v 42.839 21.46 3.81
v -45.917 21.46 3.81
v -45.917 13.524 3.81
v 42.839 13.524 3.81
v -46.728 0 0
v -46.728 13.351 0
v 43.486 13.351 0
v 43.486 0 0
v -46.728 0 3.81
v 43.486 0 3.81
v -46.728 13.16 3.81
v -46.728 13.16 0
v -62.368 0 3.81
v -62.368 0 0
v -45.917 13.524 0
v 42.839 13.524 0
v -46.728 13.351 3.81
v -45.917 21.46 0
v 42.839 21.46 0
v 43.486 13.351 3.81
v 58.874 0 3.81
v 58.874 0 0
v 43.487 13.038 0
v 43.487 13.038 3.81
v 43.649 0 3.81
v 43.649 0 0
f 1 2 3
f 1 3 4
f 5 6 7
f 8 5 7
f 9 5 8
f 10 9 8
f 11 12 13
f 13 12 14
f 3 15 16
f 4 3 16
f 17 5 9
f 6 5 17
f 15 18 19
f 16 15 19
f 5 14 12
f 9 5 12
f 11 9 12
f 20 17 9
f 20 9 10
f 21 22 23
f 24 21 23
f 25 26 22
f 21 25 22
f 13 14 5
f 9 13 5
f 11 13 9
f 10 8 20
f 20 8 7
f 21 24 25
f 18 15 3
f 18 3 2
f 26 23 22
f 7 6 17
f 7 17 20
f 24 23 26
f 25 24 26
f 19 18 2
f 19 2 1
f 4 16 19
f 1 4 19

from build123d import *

# Parameters (mm, degrees)
F0_W     = 90.213898
F0_H     = 13.350895
F1_DEPTH = 3.81
F3_DEPTH = 3.81
F5_DEPTH = 3.81
F6_W     = 88.756032
F6_H     = 7.936216
F7_DEPTH = 3.81


with BuildPart() as f1:
    # F0 (on Top) → F1 (new body)
    with BuildSketch(Plane.XY):
        with Locations((-1.621181, 6.675447)):
            Rectangle(F0_W, F0_H)
    extrude(amount=F1_DEPTH)


with BuildPart() as f3:
    # F2 (on Top) → F3 (new body)
    with BuildSketch(Plane.XY):
        Polygon((-46.72813, 0), (-46.72813, 13.160166), (-62.367748, 0), align=None)
    extrude(amount=F3_DEPTH)


with BuildPart() as f5:
    # F4 (on Top) → F5 (new body)
    with BuildSketch(Plane.XY):
        Polygon((58.873754, 0), (43.487221, 13.038067), (43.649182, 0), align=None)
    extrude(amount=F5_DEPTH)


with BuildPart() as f7:
    # F6 (on Top) → F7 (new body)
    with BuildSketch(Plane.XY):
        with Locations((-1.538657, 17.492066)):
            Rectangle(F6_W, F6_H)
    extrude(amount=F7_DEPTH)


solid = Compound([f1.part, f3.part, f5.part, f7.part])
